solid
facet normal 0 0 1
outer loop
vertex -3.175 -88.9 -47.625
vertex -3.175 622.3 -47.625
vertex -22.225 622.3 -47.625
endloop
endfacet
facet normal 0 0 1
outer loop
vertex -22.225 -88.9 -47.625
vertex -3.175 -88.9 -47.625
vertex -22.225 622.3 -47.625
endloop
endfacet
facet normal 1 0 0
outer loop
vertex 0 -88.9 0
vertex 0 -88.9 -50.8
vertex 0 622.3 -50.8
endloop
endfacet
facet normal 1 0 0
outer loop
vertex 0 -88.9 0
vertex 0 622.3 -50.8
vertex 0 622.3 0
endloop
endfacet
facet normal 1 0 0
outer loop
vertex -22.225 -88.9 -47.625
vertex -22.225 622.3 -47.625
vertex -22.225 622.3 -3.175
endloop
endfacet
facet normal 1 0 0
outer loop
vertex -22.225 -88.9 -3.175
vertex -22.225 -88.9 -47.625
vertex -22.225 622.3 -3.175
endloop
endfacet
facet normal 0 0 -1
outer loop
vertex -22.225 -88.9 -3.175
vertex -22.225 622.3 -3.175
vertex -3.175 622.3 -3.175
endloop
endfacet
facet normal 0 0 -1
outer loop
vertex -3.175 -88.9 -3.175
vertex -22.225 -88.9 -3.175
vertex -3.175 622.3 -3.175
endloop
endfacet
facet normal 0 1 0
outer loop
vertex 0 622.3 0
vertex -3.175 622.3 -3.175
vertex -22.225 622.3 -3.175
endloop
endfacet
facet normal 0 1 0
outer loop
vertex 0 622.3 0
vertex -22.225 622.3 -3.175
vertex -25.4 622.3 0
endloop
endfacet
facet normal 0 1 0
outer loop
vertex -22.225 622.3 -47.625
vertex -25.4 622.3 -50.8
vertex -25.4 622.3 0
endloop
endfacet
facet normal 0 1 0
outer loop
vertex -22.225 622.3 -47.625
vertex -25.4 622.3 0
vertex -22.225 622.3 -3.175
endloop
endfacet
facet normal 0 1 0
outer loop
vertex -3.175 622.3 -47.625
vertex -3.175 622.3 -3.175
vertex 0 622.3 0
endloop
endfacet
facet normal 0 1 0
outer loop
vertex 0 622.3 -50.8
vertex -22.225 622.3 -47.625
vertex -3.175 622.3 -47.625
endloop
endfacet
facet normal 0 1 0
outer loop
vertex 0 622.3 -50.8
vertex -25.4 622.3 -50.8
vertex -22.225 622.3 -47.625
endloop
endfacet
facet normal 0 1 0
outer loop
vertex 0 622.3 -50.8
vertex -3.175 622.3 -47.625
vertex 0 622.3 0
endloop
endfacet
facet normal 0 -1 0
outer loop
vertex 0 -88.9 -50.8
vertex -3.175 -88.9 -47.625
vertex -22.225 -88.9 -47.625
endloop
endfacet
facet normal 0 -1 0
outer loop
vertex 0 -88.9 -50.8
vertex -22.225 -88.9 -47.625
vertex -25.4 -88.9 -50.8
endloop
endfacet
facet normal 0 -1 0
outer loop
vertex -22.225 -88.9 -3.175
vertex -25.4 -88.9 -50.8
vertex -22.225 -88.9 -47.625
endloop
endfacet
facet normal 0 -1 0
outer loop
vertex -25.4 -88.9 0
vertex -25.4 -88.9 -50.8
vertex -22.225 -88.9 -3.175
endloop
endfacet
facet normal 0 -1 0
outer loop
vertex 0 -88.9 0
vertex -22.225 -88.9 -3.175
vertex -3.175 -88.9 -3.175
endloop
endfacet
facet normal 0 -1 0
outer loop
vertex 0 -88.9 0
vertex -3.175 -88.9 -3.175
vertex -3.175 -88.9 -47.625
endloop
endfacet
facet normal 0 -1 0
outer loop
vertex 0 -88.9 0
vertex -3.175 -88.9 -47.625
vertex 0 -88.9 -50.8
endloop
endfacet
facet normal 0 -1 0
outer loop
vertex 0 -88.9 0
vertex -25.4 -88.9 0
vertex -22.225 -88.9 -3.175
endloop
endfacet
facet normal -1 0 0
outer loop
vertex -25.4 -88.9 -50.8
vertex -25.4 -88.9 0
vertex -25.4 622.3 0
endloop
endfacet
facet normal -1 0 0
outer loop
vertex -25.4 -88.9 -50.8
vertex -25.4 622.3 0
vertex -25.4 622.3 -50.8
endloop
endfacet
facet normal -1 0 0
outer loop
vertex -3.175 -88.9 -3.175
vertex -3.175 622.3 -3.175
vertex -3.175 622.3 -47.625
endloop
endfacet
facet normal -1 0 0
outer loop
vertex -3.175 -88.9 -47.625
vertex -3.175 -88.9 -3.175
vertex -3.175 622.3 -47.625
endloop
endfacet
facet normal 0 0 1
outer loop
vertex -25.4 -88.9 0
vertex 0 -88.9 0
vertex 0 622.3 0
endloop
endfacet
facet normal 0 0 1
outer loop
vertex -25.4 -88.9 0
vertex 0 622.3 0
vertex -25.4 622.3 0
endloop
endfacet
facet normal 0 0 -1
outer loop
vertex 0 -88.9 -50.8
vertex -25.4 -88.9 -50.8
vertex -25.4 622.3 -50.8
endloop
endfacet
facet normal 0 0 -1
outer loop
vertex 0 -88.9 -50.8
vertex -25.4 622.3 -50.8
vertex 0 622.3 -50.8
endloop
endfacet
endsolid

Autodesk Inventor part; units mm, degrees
ref_plane "YZ Plane" through (0, 0, 0) normal (1, 0, 0) x (0, 1, 0)
ref_plane "XZ Plane" through (0, 0, 0) normal (0, 1, 0) x (-1, 0, 0)
ref_plane "XY Plane" through (0, 0, 0) normal (0, 0, 1) x (1, 0, 0)
sketch "Sketch1" plane through (0, 0, 0) normal (0, 1, 0) x (-1, 0, 0)
  line L0 (0, 0) -> (25.4, 0)
  line L1 (25.4, 0) -> (25.4, -50.8)
  line L2 (25.4, -50.8) -> (0, -50.8)
  line L3 (0, -50.8) -> (0, 0)
  line L4 (22.225, -47.625) -> (22.225, -3.175)
  line L5 (22.225, -3.175) -> (3.175, -3.175)
  line L6 (3.175, -3.175) -> (3.175, -47.625)
  line L7 (3.175, -47.625) -> (22.225, -47.625)
  dimension "d0" = 25.4
  dimension "d1" = 50.8
  dimension "d2" = 3.175
extrude "Extrusion1" add sketch "Sketch1" along normal blind 533.4
sketch "Sketch2" plane through (0, 0, 0) normal (1, 0, 0) x (0, 0, -1)
  point P0 (0, 0)
sketch "Sketch3" plane through (0, 0, 0) normal (0, -1, 0) x (1, 0, 0)
  line L0 (-3.175, -47.625) -> (-22.225, -47.625) projected
  line L1 (-22.225, -47.625) -> (-22.225, -3.175) projected
  line L2 (-22.225, -3.175) -> (-3.175, -3.175) projected
  line L3 (-3.175, -3.175) -> (-3.175, -47.625) projected
  line L4 (0, 0) -> (-25.4, 0) projected
  line L5 (-25.4, 0) -> (-25.4, -50.8) projected
  line L6 (-25.4, -50.8) -> (0, -50.8) projected
  line L7 (0, -50.8) -> (0, 0) projected
extrude "Extrusion2" add sketch "Sketch3" along normal blind 88.9
sketch "Sketch4" plane through (0, 533.4, 0) normal (0, 1, 0) x (1, 0, 0)
  line L0 (-22.225, 47.625) -> (-3.175, 47.625) projected
  line L1 (-3.175, 47.625) -> (-3.175, 3.175) projected
  line L2 (-3.175, 3.175) -> (-22.225, 3.175) projected
  line L3 (-22.225, 3.175) -> (-22.225, 47.625) projected
  line L4 (-25.4, 0) -> (0, 0) projected
  line L5 (0, 0) -> (0, 50.8) projected
  line L6 (0, 50.8) -> (-25.4, 50.8) projected
  line L7 (-25.4, 50.8) -> (-25.4, 0) projected
extrude "Extrusion3" add sketch "Sketch4" along normal blind 88.9
sketch "Sketch6" plane through (0, -88.9, 0) normal (1, 0, 0) x (0, 0, -1)
  line L0 (29.7808, 711.2) -> (29.7808, 547.6875) projected
  line L1 (50.8, 711.2) -> (50.8, 0) projected
  line L2 (0, 711.2) -> (50.8, 711.2) projected
  line L3 (0, 0) -> (0, 711.2) projected
  line L4 (50.8, 0) -> (0, 0) projected
  line L5 (0, 0) -> (0, 711.2) projected
  line L6 (0, 711.2) -> (50.8, 711.2)
  line L7 (50.8, 711.2) -> (50.8, 685.8)
  line L8 (50.8, 685.8) -> (0, 685.8)
  line L9 (0, 685.8) -> (0, 711.2)
  point P0 (0, 88.9)
  dimension "d14" = 25.4
extrude "Extrusion5" cut sketch "Sketch6" against normal blind 25.4 contours L2 L1 L8 L0 | L0 L8 L3 L2
sketch "Sketch7" plane through (0, 596.9, 0) normal (0, 1, 0) x (1, 0, 0)
  line L0 (-3.175, 47.625) -> (-22.225, 47.625) projected
  line L1 (-3.175, 3.175) -> (-3.175, 47.625) projected
  line L2 (-22.225, 3.175) -> (-3.175, 3.175) projected
  line L3 (-22.225, 47.625) -> (-22.225, 3.175) projected
  line L4 (0, 50.8) -> (0, 0) projected
  line L5 (-25.4, 50.8) -> (0, 50.8) projected
  line L6 (-25.4, 0) -> (-25.4, 50.8) projected
  line L7 (0, 0) -> (-25.4, 0) projected
  point P0 (0, 0)
extrude "Extrusion6" add sketch "Sketch7" along normal blind 25.4
properties part number "2x1 20in Alluminum.ver1-1111-2019"
